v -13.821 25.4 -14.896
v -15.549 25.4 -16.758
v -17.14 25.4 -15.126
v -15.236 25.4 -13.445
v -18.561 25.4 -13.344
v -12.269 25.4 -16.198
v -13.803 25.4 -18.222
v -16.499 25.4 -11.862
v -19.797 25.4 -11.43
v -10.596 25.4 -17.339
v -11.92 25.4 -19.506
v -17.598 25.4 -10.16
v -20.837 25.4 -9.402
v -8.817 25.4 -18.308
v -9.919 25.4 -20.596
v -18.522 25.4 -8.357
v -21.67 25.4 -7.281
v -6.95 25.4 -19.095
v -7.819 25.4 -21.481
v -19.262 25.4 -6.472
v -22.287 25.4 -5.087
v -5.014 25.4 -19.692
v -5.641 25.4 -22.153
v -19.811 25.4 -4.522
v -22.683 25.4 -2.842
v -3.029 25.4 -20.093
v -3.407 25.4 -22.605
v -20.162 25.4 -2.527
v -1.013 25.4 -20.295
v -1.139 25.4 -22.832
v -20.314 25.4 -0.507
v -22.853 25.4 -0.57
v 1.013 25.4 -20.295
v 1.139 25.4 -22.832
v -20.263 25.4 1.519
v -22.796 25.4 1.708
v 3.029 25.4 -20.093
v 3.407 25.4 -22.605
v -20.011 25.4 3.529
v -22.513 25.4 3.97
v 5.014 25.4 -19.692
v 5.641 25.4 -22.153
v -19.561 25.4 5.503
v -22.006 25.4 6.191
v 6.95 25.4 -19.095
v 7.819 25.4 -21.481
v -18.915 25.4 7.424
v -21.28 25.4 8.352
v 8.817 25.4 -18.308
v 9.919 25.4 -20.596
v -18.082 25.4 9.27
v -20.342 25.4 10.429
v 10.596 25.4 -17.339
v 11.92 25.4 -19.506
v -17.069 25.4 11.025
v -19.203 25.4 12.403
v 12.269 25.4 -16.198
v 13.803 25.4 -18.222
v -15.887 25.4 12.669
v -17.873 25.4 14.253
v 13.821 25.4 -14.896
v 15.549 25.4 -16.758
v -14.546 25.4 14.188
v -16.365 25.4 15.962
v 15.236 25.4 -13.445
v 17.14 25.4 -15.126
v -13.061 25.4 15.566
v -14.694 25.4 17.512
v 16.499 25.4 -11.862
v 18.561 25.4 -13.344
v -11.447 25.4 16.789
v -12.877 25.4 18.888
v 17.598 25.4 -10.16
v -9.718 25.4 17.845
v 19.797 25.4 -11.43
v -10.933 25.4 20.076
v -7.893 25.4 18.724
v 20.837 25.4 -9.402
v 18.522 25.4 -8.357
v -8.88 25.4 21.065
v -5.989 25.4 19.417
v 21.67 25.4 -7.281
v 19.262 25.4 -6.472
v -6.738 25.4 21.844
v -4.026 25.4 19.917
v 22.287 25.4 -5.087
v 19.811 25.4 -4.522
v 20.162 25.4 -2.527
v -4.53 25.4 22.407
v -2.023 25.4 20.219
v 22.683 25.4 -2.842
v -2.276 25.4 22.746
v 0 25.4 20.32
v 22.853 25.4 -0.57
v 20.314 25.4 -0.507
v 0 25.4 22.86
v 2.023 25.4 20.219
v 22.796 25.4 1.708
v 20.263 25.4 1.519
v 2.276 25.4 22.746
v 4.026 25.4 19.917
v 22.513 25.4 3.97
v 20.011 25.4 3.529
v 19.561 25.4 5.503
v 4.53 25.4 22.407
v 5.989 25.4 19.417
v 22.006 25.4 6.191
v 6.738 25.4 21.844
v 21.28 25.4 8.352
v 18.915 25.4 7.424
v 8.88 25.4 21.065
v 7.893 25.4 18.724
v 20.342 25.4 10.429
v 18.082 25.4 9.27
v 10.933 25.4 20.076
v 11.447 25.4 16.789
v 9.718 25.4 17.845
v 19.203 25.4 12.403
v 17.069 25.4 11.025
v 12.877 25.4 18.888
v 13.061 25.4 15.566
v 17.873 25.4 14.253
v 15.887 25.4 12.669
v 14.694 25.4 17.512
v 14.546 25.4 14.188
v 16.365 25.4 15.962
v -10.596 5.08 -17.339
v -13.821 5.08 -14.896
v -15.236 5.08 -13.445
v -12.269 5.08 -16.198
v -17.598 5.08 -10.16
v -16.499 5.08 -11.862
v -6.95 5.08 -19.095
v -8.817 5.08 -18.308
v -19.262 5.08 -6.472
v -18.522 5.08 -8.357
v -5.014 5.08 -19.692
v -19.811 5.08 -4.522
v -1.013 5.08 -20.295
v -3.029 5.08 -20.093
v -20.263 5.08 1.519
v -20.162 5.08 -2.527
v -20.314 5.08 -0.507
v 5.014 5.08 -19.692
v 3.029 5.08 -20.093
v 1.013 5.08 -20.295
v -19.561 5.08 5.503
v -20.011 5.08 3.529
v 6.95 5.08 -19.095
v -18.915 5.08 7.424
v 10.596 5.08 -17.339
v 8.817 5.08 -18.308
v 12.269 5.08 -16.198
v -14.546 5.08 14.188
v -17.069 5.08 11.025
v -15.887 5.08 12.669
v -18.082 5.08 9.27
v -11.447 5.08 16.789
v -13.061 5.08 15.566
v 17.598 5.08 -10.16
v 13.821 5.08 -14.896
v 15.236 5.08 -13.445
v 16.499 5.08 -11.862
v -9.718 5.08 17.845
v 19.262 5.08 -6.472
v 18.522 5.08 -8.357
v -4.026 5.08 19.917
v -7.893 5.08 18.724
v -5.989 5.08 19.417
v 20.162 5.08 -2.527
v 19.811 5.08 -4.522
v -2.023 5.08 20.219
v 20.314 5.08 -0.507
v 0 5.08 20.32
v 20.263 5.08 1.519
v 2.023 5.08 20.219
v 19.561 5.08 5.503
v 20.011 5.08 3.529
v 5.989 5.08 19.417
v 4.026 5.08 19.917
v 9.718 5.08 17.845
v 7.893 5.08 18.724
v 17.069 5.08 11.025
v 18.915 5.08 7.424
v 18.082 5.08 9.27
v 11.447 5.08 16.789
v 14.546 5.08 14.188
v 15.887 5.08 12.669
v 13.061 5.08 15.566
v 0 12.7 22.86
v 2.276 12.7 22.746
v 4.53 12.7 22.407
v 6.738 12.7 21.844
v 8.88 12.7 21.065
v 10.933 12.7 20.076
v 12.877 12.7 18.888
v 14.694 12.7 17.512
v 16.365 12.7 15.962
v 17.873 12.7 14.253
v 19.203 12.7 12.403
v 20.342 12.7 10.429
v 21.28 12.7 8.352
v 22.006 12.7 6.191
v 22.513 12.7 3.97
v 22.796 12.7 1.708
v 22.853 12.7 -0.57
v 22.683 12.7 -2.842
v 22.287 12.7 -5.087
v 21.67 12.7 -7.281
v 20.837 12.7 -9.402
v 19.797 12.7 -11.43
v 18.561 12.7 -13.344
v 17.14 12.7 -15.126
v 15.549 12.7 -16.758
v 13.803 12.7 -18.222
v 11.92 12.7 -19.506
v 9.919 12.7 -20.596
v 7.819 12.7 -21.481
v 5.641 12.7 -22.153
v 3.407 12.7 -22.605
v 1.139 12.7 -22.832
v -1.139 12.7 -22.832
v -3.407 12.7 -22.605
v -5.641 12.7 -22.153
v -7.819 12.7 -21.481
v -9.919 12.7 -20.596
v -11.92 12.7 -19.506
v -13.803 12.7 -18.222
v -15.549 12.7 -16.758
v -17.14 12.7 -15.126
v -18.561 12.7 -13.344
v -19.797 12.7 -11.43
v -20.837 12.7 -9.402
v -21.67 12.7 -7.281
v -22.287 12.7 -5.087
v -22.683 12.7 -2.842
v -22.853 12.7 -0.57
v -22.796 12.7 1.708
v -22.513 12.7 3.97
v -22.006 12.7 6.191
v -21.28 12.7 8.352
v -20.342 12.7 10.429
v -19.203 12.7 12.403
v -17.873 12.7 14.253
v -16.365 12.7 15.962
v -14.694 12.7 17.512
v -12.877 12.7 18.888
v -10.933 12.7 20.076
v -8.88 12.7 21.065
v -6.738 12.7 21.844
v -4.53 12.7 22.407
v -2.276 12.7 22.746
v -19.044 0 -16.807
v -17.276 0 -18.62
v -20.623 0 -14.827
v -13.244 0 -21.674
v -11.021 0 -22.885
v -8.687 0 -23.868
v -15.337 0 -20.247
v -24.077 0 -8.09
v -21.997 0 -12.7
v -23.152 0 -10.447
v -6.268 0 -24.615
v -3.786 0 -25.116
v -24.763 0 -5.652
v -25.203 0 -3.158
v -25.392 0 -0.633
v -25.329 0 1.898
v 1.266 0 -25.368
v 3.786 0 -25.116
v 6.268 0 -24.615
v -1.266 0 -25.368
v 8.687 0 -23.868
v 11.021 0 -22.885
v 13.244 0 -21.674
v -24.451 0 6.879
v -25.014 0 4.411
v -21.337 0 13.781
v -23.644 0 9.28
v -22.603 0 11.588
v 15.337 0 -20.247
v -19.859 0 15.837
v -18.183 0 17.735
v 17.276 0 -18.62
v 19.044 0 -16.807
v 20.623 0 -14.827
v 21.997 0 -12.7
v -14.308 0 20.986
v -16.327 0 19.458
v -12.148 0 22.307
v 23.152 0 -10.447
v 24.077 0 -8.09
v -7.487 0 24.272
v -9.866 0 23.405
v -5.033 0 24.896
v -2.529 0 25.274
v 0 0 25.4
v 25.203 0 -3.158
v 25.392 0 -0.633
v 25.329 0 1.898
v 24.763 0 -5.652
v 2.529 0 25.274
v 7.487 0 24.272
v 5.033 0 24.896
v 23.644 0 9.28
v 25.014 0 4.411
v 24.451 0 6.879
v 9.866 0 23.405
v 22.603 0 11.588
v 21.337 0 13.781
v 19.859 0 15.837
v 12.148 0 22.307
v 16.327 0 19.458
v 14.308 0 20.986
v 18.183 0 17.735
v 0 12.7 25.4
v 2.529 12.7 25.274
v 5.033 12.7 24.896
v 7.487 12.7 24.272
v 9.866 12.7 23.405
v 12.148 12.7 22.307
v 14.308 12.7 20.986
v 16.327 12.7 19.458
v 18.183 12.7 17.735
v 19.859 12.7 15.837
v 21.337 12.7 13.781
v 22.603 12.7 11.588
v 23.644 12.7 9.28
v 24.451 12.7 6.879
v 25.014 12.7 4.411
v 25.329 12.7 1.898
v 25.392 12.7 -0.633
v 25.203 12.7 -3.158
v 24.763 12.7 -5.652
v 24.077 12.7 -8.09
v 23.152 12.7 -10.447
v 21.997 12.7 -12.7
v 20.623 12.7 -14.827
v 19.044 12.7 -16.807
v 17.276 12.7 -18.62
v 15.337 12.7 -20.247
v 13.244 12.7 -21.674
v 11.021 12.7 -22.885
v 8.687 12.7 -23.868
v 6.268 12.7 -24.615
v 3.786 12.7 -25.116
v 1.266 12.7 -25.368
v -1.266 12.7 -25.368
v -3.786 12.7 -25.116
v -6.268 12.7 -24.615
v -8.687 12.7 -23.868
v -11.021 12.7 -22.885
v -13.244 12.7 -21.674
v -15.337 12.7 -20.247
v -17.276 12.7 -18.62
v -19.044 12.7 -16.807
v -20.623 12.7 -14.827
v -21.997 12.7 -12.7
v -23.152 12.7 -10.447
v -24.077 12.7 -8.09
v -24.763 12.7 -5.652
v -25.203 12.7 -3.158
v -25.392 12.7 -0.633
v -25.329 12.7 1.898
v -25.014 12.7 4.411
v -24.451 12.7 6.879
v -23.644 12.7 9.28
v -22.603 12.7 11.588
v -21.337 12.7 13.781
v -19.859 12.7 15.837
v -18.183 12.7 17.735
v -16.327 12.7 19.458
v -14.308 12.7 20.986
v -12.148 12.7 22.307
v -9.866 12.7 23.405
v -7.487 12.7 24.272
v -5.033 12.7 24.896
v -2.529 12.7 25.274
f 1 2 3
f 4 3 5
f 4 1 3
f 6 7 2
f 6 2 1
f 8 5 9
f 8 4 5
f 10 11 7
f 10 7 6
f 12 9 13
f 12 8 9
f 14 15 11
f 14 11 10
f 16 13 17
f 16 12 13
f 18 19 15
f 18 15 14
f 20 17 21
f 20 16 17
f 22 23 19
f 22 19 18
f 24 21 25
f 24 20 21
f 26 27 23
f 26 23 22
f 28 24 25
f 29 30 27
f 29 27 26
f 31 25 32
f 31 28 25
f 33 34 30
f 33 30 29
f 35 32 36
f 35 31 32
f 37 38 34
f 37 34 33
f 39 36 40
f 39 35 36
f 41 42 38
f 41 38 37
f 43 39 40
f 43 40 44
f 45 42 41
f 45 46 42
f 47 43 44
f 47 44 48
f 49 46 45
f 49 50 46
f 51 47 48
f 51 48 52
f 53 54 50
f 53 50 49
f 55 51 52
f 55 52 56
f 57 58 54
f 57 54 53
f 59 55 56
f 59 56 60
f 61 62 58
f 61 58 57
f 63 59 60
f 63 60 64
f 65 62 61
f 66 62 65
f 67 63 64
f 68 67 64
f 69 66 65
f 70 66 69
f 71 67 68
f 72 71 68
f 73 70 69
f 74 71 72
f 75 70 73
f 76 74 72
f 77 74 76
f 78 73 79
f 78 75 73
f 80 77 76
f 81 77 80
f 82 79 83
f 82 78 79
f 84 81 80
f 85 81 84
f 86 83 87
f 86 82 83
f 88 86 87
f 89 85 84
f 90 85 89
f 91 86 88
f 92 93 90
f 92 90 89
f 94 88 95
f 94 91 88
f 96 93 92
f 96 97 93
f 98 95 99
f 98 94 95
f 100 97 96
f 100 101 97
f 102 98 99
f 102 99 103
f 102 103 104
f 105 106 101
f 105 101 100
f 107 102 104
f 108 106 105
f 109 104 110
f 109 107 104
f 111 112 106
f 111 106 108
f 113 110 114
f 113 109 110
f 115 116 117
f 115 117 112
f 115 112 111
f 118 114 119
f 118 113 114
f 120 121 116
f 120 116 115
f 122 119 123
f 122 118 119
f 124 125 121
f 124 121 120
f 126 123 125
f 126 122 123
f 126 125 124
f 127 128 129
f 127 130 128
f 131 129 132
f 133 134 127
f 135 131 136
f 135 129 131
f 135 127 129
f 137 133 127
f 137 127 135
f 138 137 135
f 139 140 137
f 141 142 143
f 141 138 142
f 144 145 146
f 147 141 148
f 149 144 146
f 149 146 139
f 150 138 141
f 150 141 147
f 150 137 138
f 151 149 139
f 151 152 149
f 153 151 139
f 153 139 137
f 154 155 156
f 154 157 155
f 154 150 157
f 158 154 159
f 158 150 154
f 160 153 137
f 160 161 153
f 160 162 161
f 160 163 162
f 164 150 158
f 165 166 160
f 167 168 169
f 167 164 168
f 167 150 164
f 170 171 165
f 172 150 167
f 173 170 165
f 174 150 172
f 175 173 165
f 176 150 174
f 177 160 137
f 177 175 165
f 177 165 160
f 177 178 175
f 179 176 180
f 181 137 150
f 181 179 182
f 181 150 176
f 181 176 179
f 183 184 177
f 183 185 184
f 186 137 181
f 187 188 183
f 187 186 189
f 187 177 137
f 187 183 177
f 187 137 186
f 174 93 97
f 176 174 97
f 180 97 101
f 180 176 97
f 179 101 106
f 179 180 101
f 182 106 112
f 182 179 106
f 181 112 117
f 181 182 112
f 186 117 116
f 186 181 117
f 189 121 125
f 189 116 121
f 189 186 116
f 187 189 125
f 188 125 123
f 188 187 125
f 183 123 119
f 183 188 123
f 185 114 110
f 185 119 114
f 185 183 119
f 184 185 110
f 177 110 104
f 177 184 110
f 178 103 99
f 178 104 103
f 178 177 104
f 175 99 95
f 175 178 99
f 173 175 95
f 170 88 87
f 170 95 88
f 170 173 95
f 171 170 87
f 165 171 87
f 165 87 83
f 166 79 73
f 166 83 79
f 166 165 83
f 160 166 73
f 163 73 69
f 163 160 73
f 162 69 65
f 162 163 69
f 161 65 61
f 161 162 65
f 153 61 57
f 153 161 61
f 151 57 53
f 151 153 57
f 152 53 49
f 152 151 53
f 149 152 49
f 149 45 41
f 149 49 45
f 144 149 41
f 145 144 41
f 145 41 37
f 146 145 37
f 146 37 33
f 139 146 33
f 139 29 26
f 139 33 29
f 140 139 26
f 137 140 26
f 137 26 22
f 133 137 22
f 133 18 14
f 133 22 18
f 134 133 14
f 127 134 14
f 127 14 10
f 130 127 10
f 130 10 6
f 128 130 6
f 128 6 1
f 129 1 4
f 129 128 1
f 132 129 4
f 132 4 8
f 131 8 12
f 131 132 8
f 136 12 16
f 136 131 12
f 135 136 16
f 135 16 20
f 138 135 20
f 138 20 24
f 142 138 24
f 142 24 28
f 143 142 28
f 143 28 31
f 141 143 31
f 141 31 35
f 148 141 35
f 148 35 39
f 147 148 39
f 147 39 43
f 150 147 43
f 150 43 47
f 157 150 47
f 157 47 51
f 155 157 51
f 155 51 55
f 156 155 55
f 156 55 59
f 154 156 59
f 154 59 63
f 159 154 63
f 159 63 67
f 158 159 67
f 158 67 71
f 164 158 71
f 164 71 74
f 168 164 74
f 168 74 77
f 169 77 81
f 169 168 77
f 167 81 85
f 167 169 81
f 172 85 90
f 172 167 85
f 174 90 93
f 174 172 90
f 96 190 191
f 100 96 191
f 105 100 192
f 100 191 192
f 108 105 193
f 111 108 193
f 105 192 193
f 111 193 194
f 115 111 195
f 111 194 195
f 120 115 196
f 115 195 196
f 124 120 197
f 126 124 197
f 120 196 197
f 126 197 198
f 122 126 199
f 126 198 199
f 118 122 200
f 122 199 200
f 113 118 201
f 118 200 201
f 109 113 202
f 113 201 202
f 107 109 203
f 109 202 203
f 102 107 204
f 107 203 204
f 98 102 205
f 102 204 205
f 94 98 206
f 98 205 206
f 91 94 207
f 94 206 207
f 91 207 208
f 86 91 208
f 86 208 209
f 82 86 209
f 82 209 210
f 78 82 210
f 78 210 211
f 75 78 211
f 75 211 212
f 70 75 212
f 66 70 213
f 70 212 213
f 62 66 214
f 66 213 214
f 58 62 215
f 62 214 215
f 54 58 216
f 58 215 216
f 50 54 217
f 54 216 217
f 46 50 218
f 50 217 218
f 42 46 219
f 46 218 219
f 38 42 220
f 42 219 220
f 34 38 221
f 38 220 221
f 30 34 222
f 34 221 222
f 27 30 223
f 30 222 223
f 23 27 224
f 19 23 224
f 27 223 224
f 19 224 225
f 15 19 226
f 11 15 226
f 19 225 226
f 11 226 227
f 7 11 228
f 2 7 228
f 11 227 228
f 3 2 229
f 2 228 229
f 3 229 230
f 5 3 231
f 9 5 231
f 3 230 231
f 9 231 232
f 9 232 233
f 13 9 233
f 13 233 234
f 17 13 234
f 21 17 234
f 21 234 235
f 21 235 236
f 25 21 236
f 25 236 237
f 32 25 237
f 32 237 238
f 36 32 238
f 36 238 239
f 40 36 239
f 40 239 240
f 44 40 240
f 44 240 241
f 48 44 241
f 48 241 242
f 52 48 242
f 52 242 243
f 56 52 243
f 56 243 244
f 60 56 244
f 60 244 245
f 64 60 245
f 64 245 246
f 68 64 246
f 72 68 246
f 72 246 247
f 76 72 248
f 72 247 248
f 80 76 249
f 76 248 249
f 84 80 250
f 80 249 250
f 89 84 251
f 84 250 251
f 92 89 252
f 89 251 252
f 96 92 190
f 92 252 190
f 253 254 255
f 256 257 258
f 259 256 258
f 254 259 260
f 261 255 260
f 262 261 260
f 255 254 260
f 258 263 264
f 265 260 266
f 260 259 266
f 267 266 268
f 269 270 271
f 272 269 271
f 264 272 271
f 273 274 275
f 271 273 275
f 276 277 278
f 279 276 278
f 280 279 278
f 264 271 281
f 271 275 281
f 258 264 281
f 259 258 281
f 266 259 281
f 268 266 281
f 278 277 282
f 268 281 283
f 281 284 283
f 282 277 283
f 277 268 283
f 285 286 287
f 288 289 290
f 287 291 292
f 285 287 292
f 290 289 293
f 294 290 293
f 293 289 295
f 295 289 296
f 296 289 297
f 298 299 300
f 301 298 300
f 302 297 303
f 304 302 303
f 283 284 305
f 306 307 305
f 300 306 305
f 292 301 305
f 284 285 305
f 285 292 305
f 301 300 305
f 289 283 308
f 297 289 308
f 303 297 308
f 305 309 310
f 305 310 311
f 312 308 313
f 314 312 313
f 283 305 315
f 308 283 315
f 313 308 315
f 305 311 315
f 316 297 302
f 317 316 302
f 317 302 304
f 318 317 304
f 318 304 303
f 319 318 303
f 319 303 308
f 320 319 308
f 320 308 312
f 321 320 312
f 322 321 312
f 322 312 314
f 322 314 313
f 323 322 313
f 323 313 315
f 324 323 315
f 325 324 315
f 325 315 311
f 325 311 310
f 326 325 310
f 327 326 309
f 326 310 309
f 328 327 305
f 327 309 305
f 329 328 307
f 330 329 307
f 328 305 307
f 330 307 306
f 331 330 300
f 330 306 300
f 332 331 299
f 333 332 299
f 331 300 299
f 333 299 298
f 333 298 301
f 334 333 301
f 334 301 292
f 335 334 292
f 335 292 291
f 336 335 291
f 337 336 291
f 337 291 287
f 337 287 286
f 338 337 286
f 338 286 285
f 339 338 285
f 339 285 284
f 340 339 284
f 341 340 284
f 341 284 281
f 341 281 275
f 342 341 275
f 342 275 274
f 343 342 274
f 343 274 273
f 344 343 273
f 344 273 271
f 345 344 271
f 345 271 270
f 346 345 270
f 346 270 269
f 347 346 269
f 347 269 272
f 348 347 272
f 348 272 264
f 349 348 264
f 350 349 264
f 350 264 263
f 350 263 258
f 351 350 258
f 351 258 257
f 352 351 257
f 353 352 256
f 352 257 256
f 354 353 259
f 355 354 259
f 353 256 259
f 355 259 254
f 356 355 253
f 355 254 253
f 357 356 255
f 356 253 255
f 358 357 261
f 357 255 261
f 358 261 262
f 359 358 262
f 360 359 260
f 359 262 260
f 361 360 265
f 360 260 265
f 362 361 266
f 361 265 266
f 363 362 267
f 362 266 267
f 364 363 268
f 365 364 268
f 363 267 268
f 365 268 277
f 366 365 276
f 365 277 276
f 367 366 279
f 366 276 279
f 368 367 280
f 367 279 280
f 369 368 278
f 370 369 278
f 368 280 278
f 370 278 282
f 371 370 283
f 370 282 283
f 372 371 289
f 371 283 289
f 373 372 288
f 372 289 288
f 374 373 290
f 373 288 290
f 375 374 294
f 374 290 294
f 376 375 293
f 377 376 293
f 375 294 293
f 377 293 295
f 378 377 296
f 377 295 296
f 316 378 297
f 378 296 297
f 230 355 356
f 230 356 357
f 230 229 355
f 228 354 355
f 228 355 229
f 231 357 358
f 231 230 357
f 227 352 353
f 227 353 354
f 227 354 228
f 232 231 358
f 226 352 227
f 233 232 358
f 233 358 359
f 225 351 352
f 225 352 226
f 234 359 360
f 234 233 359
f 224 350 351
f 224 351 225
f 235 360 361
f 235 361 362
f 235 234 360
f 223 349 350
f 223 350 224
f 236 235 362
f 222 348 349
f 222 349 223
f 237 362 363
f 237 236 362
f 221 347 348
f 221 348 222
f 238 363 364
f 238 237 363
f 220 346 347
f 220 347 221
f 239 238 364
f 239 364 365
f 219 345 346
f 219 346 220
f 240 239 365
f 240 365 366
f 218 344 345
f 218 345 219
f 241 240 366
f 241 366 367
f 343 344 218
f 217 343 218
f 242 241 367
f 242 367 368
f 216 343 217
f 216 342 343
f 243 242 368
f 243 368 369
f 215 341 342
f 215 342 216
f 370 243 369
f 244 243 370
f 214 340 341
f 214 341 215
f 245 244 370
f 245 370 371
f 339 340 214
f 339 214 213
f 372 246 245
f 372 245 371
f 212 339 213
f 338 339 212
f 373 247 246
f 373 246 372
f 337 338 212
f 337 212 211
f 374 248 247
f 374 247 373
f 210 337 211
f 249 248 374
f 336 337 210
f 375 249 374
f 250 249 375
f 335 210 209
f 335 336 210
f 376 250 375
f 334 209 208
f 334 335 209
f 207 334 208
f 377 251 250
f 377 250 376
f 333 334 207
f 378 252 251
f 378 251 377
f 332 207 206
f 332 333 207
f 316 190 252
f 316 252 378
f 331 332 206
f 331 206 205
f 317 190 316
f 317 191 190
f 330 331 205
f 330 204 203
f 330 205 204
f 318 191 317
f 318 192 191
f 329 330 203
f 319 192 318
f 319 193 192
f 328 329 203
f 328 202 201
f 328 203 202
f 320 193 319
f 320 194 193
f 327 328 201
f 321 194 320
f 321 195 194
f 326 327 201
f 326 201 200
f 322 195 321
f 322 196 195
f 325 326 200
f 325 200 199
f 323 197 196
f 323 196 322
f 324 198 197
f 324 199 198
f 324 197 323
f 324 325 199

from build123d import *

# Parameters (mm, degrees)
SKETCH1_R           = 25.4
BOSS_EXTRUDE1_DEPTH = 25.4
SHELL2_T            = -5.08
CUT_EXTRUDE3_START  = -12.7
SKETCH3_R           = 25.4
SKETCH3_R_2         = 22.86
CUT_EXTRUDE3_DEPTH  = 12.7


with BuildPart() as part:
    # Sketch1 → Boss-Extrude1 (new body)
    with BuildSketch(Plane(origin=(0, 0, 0), x_dir=(1, 0, 0), z_dir=(0, 1, 0))):
        with Locations(Location((0, 0, 0), (0, 0, 270))):
            Circle(SKETCH1_R)
    extrude(amount=BOSS_EXTRUDE1_DEPTH)

    # Shell2
    shell2_openings = [part.faces().sort_by_distance(p)[0] for p in [
        (0, 25.4, 0),
    ]]
    offset(amount=SHELL2_T, openings=shell2_openings, kind=Kind.INTERSECTION)

    # Sketch3 → Cut-Extrude3 (cut)
    with BuildSketch(Plane(origin=(0, 25.4, 0), x_dir=(1, 0, 0), z_dir=(0, 1, 0)).offset(CUT_EXTRUDE3_START)):
        with Locations(Location((0, 0, 0), (0, 0, 270))):
            Circle(SKETCH3_R)
        with Locations(Location((0, 0, 0), (0, 0, 270))):
            Circle(SKETCH3_R_2, mode=Mode.SUBTRACT)
    extrude(amount=CUT_EXTRUDE3_DEPTH, mode=Mode.SUBTRACT)


solid = part.part
